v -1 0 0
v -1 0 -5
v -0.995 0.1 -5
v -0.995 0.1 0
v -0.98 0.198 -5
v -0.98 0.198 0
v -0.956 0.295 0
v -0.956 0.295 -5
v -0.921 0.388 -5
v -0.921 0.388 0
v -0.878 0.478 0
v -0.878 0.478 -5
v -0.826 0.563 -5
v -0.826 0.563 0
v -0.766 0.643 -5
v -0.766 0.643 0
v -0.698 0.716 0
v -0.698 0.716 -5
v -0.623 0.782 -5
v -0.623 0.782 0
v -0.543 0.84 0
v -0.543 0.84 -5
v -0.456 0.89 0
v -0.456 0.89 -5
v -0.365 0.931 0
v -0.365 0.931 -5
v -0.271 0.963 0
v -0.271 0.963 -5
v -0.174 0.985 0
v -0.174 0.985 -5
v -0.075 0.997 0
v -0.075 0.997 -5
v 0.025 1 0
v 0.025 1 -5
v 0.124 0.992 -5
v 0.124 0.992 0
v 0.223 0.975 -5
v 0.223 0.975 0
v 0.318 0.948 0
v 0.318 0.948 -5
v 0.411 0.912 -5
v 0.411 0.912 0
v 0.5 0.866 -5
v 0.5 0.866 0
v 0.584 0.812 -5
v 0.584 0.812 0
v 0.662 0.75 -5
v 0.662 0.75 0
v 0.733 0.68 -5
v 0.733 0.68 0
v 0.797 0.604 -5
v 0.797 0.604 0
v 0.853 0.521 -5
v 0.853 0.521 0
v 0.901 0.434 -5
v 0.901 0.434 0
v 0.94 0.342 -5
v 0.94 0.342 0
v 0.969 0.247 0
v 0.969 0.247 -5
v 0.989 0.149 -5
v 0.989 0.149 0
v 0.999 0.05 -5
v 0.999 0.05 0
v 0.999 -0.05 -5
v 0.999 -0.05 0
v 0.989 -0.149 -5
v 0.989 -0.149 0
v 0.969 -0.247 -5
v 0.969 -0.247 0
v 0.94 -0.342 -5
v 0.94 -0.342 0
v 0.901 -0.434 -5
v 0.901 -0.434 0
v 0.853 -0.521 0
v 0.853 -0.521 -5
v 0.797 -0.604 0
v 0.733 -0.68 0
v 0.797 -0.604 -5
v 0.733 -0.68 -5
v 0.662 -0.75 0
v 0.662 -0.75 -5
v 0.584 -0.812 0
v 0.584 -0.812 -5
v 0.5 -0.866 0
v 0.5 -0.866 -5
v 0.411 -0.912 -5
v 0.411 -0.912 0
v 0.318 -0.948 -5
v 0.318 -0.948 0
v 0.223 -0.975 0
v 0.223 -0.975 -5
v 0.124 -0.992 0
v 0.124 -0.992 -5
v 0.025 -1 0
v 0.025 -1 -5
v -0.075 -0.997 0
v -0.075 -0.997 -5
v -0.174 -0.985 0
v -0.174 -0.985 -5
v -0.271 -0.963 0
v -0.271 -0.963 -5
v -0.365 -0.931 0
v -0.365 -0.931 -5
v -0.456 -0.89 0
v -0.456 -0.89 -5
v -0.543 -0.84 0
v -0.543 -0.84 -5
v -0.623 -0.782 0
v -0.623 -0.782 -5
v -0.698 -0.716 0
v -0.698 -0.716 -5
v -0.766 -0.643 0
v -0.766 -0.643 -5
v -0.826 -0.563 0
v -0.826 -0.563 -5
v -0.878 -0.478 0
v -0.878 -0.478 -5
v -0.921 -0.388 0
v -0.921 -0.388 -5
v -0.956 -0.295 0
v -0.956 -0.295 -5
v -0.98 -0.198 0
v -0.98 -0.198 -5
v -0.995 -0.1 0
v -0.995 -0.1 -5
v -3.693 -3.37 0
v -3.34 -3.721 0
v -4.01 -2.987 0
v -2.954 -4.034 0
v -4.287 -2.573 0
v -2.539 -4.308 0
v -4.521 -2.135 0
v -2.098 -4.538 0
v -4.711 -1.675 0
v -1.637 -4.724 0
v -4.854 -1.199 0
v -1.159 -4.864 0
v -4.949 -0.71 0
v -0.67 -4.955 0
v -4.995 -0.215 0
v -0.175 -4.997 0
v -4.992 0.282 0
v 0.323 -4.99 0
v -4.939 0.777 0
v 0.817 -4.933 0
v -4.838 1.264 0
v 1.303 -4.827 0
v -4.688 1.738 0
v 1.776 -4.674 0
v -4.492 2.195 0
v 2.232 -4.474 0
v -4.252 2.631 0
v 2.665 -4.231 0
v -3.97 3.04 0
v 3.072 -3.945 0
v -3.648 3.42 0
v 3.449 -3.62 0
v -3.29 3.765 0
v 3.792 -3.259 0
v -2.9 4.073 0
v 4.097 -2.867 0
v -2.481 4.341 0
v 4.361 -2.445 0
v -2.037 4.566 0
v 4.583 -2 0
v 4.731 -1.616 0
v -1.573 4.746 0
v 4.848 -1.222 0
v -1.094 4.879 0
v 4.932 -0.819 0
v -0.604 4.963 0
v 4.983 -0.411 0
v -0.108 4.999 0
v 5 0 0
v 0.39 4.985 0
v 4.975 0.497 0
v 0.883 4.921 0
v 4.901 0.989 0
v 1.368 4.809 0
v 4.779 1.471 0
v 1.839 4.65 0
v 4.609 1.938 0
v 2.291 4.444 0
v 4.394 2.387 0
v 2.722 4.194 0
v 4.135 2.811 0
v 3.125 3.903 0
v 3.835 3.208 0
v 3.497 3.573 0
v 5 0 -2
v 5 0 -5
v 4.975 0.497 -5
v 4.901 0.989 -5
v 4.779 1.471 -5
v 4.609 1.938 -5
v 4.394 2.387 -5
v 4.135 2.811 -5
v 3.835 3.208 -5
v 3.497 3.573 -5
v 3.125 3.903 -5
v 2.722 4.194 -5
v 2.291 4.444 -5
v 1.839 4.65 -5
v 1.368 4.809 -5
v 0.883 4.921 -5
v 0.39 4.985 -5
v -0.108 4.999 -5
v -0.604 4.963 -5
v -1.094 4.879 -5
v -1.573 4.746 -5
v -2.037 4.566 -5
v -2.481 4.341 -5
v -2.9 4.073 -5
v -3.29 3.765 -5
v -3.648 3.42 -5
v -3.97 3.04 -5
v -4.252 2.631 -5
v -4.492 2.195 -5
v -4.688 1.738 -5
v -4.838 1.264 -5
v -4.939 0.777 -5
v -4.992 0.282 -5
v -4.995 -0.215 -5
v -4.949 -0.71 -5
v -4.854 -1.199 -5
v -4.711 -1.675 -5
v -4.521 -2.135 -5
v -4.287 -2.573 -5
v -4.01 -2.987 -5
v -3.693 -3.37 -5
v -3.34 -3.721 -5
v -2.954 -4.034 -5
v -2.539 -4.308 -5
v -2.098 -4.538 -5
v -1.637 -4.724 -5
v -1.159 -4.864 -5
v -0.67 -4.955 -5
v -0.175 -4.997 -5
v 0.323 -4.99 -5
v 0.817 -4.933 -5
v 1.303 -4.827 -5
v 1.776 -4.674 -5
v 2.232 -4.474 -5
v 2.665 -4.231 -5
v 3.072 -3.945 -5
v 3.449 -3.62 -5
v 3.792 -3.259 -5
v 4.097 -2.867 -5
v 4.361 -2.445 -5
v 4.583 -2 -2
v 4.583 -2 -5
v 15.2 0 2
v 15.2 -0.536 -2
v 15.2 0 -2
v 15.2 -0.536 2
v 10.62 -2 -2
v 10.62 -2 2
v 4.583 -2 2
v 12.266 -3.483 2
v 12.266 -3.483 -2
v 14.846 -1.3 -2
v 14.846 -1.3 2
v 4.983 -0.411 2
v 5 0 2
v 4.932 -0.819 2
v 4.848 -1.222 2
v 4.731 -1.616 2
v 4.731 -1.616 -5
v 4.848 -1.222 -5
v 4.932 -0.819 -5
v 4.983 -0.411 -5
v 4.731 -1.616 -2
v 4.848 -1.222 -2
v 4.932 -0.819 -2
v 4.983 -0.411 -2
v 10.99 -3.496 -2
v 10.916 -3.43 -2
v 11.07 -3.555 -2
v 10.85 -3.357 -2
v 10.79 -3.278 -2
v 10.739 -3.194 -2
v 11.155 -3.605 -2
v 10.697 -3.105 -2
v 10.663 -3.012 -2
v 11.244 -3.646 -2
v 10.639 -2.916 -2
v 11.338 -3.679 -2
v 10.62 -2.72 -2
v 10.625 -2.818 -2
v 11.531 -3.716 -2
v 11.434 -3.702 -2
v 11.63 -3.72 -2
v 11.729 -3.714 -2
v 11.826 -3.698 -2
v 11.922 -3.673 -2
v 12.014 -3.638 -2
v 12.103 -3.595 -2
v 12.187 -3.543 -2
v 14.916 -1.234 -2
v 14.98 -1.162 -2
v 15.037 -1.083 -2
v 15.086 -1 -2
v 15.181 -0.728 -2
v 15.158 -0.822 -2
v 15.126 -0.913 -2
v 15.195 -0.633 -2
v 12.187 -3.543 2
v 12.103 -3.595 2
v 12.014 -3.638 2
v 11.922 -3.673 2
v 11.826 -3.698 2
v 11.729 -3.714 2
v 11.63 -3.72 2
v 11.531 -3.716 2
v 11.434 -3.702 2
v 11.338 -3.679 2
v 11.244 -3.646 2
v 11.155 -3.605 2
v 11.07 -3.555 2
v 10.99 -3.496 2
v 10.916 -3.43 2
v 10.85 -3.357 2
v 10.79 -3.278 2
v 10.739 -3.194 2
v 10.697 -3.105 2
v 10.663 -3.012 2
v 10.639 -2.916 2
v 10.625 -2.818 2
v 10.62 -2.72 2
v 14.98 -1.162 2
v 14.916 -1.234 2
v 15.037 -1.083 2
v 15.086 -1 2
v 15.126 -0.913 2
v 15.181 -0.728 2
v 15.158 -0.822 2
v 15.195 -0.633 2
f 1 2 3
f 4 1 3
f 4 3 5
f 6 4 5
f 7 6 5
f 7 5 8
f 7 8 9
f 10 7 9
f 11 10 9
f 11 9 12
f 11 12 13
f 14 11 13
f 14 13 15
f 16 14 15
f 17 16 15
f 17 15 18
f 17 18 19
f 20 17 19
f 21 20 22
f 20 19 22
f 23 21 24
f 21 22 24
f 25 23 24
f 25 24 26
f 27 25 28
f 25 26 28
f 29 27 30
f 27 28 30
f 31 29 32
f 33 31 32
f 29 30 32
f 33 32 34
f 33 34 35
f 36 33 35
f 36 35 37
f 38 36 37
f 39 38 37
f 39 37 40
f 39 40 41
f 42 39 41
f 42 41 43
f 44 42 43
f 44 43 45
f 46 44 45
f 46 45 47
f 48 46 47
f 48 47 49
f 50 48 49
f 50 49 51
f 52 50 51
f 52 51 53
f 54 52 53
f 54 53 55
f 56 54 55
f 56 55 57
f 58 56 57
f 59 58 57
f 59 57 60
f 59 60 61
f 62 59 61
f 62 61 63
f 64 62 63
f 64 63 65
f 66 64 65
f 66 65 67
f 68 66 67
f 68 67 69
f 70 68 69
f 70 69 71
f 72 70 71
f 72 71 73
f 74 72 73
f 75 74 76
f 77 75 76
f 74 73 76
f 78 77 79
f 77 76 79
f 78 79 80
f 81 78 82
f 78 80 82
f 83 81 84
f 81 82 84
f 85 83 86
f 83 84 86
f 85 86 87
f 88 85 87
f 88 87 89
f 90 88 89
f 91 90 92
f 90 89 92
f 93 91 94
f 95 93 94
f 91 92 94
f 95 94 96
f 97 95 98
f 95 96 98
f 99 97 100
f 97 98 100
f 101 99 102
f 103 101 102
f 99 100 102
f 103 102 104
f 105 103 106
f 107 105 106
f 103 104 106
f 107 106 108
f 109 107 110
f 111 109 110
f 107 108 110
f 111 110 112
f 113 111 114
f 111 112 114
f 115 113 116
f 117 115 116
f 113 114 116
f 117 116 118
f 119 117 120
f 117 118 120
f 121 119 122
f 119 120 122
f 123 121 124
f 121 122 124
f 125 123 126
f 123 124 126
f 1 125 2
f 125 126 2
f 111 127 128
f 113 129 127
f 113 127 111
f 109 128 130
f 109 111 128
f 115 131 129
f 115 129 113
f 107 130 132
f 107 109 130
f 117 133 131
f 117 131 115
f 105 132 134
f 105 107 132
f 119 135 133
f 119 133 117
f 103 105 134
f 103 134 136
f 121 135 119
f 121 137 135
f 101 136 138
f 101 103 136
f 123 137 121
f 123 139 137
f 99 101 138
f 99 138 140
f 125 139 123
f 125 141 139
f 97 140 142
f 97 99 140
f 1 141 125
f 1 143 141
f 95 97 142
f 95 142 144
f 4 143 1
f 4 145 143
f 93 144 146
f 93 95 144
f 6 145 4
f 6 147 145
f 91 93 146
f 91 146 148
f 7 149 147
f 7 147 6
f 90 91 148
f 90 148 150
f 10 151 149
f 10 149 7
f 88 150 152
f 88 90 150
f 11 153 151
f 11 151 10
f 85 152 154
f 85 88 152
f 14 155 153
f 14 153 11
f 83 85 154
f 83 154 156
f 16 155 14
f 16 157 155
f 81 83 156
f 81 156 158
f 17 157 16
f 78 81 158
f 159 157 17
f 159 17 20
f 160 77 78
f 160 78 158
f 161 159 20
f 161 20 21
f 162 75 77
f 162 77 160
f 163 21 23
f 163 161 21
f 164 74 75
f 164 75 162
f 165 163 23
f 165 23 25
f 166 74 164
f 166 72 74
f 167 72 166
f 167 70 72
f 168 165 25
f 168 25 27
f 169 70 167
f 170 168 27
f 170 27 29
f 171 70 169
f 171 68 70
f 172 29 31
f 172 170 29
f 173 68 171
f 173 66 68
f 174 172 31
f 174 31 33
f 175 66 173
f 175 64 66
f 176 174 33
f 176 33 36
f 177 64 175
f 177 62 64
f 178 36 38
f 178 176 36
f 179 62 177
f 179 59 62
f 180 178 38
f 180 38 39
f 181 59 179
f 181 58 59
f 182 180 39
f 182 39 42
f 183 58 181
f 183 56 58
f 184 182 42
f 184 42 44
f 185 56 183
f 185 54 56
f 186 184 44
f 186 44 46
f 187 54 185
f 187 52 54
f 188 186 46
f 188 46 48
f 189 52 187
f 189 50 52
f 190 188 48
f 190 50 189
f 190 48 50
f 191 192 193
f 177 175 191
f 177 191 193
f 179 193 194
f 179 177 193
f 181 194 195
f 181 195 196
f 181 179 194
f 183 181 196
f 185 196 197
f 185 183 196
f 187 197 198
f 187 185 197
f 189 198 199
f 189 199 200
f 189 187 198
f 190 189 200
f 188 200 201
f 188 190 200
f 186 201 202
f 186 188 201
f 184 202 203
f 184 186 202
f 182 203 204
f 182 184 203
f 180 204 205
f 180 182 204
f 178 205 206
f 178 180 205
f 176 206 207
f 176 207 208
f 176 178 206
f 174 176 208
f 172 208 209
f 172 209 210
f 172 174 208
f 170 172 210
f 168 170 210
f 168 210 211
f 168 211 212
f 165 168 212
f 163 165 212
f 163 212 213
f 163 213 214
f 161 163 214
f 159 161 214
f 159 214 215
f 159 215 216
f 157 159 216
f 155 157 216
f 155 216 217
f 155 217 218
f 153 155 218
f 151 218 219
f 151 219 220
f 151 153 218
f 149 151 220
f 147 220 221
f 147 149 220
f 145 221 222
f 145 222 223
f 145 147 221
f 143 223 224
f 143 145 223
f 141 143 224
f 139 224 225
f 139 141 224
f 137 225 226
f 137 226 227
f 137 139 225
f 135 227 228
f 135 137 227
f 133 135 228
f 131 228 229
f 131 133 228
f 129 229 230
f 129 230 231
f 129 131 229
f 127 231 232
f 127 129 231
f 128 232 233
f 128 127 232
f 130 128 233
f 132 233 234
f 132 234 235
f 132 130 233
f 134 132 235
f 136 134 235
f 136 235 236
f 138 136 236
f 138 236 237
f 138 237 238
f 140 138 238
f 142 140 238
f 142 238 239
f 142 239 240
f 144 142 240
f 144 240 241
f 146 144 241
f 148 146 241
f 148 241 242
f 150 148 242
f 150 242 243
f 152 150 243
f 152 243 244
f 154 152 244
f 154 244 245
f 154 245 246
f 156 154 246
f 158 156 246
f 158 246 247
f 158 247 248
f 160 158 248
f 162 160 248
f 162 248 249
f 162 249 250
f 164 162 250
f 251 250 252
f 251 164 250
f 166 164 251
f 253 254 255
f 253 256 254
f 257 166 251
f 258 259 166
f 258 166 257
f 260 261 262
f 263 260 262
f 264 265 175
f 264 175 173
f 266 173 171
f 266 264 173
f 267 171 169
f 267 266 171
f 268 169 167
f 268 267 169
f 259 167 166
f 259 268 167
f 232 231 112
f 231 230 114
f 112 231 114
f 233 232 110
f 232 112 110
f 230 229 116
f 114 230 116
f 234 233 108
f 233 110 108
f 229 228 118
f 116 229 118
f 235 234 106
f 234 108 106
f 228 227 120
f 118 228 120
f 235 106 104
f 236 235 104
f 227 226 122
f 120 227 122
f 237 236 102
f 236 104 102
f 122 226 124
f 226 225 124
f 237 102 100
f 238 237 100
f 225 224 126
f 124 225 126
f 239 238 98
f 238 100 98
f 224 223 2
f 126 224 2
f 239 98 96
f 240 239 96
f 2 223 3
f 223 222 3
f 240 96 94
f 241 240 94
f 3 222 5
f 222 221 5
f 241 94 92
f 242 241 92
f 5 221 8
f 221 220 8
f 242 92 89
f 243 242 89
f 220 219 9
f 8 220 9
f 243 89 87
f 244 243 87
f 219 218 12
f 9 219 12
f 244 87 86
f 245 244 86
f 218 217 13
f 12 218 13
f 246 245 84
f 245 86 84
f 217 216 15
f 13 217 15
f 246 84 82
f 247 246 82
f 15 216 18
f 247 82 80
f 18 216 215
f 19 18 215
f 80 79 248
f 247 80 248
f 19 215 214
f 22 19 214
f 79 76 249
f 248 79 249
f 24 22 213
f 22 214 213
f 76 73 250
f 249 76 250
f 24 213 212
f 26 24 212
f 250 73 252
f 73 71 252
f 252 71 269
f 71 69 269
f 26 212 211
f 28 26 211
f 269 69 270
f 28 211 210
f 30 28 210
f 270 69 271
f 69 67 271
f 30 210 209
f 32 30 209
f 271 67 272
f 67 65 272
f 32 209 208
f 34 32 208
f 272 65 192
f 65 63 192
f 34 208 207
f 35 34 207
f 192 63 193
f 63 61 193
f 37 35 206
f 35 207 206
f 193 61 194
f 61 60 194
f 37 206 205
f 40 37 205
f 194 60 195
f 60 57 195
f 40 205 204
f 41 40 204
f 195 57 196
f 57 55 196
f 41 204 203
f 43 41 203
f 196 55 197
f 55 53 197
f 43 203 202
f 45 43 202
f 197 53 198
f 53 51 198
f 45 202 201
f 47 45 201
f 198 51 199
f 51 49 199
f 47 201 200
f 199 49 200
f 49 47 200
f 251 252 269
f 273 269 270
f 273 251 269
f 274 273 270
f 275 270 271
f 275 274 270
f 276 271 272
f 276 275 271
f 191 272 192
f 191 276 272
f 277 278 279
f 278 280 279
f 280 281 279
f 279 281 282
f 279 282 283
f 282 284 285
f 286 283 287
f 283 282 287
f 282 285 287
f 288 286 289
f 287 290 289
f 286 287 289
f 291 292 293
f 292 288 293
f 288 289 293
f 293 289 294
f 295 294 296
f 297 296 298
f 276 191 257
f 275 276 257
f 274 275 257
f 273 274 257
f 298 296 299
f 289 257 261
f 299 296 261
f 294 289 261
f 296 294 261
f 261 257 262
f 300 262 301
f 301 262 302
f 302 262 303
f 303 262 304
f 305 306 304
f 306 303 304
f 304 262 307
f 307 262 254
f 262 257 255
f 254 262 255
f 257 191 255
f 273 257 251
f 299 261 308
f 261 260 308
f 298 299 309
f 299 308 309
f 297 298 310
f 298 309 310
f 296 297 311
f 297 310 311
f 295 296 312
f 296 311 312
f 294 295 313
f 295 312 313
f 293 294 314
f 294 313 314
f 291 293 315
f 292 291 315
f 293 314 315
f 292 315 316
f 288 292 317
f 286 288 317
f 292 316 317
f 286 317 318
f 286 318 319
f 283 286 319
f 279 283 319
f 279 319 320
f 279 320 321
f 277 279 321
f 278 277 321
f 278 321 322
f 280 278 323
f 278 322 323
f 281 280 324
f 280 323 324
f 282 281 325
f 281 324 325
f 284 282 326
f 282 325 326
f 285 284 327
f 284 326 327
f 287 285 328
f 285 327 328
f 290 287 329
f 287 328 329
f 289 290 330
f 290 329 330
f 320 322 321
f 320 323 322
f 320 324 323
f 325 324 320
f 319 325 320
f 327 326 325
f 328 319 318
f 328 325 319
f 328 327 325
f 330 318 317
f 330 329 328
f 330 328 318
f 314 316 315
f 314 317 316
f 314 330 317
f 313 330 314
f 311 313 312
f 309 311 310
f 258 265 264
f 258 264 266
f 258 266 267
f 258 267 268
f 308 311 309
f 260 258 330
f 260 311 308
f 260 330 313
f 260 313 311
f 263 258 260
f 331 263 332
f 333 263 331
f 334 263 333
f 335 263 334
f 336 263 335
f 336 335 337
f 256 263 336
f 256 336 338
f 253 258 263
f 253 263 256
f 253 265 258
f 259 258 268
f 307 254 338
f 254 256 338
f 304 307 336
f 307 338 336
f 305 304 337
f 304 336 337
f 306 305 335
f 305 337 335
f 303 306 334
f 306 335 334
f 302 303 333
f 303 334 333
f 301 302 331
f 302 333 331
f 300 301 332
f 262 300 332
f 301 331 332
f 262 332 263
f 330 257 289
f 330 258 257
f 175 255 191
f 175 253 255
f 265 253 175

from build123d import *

# Parameters (mm, degrees)
F1_DEPTH = 5
F2_DEPTH = 2
F3_DEPTH = 2
F4_R     = 1
F5_D     = 2


with BuildPart() as f1:
    # F0 (on Top) → F1 (new body)
    with BuildSketch(Plane.XY):
        with BuildLine():
            ThreePointArc((4.582575695, -2), (4.8945315647, -1.0215482184), (5, 0))
            ThreePointArc((5, 0), (-4.8945315647, 1.0215482184), (4.582575695, -2))
        make_face()
    extrude(amount=-F1_DEPTH)

    # F0 (on Top) → F2 (join)
    with BuildSketch(Plane.XY):
        with BuildLine():
            Line((13, 0), (5, 0))
            ThreePointArc((5, 0), (4.8945315647, -1.0215482184), (4.582575695, -2))
            Line((4.582575695, -2), (10.6197060227, -2))
            Line((10.6197060227, -2), (10.6197060227, -4.87568))
            Line((10.6197060227, -4.87568), (15.2, -0.999998501))
            Line((15.2, -0.999998501), (15.2, 0))
            Line((15.2, 0), (13, 0))
        make_face()
    extrude(amount=-F2_DEPTH)

    # F0 (on Top) → F3 (join, symmetric)
    with BuildSketch(Plane.XY):
        with BuildLine():
            Line((13, 0), (5, 0))
            ThreePointArc((5, 0), (4.8945315647, -1.0215482184), (4.582575695, -2))
            Line((4.582575695, -2), (10.6197060227, -2))
            Line((10.6197060227, -2), (10.6197060227, -4.87568))
            Line((10.6197060227, -4.87568), (15.2, -0.999998501))
            Line((15.2, -0.999998501), (15.2, 0))
            Line((15.2, 0), (13, 0))
        make_face()
    extrude(amount=F3_DEPTH, both=True)

    # F4
    f4_edges = [f1.edges().sort_by_distance(p)[0] for p in [
        (10.619706, -4.87568, 0),
        (15.2, -0.999999, 0),
    ]]
    fillet(f4_edges, radius=F4_R)

    # F5 (through all)
    with Locations(Plane.XY):
        with Locations((0, 0)):
            Hole(F5_D / 2)


solid = f1.part
